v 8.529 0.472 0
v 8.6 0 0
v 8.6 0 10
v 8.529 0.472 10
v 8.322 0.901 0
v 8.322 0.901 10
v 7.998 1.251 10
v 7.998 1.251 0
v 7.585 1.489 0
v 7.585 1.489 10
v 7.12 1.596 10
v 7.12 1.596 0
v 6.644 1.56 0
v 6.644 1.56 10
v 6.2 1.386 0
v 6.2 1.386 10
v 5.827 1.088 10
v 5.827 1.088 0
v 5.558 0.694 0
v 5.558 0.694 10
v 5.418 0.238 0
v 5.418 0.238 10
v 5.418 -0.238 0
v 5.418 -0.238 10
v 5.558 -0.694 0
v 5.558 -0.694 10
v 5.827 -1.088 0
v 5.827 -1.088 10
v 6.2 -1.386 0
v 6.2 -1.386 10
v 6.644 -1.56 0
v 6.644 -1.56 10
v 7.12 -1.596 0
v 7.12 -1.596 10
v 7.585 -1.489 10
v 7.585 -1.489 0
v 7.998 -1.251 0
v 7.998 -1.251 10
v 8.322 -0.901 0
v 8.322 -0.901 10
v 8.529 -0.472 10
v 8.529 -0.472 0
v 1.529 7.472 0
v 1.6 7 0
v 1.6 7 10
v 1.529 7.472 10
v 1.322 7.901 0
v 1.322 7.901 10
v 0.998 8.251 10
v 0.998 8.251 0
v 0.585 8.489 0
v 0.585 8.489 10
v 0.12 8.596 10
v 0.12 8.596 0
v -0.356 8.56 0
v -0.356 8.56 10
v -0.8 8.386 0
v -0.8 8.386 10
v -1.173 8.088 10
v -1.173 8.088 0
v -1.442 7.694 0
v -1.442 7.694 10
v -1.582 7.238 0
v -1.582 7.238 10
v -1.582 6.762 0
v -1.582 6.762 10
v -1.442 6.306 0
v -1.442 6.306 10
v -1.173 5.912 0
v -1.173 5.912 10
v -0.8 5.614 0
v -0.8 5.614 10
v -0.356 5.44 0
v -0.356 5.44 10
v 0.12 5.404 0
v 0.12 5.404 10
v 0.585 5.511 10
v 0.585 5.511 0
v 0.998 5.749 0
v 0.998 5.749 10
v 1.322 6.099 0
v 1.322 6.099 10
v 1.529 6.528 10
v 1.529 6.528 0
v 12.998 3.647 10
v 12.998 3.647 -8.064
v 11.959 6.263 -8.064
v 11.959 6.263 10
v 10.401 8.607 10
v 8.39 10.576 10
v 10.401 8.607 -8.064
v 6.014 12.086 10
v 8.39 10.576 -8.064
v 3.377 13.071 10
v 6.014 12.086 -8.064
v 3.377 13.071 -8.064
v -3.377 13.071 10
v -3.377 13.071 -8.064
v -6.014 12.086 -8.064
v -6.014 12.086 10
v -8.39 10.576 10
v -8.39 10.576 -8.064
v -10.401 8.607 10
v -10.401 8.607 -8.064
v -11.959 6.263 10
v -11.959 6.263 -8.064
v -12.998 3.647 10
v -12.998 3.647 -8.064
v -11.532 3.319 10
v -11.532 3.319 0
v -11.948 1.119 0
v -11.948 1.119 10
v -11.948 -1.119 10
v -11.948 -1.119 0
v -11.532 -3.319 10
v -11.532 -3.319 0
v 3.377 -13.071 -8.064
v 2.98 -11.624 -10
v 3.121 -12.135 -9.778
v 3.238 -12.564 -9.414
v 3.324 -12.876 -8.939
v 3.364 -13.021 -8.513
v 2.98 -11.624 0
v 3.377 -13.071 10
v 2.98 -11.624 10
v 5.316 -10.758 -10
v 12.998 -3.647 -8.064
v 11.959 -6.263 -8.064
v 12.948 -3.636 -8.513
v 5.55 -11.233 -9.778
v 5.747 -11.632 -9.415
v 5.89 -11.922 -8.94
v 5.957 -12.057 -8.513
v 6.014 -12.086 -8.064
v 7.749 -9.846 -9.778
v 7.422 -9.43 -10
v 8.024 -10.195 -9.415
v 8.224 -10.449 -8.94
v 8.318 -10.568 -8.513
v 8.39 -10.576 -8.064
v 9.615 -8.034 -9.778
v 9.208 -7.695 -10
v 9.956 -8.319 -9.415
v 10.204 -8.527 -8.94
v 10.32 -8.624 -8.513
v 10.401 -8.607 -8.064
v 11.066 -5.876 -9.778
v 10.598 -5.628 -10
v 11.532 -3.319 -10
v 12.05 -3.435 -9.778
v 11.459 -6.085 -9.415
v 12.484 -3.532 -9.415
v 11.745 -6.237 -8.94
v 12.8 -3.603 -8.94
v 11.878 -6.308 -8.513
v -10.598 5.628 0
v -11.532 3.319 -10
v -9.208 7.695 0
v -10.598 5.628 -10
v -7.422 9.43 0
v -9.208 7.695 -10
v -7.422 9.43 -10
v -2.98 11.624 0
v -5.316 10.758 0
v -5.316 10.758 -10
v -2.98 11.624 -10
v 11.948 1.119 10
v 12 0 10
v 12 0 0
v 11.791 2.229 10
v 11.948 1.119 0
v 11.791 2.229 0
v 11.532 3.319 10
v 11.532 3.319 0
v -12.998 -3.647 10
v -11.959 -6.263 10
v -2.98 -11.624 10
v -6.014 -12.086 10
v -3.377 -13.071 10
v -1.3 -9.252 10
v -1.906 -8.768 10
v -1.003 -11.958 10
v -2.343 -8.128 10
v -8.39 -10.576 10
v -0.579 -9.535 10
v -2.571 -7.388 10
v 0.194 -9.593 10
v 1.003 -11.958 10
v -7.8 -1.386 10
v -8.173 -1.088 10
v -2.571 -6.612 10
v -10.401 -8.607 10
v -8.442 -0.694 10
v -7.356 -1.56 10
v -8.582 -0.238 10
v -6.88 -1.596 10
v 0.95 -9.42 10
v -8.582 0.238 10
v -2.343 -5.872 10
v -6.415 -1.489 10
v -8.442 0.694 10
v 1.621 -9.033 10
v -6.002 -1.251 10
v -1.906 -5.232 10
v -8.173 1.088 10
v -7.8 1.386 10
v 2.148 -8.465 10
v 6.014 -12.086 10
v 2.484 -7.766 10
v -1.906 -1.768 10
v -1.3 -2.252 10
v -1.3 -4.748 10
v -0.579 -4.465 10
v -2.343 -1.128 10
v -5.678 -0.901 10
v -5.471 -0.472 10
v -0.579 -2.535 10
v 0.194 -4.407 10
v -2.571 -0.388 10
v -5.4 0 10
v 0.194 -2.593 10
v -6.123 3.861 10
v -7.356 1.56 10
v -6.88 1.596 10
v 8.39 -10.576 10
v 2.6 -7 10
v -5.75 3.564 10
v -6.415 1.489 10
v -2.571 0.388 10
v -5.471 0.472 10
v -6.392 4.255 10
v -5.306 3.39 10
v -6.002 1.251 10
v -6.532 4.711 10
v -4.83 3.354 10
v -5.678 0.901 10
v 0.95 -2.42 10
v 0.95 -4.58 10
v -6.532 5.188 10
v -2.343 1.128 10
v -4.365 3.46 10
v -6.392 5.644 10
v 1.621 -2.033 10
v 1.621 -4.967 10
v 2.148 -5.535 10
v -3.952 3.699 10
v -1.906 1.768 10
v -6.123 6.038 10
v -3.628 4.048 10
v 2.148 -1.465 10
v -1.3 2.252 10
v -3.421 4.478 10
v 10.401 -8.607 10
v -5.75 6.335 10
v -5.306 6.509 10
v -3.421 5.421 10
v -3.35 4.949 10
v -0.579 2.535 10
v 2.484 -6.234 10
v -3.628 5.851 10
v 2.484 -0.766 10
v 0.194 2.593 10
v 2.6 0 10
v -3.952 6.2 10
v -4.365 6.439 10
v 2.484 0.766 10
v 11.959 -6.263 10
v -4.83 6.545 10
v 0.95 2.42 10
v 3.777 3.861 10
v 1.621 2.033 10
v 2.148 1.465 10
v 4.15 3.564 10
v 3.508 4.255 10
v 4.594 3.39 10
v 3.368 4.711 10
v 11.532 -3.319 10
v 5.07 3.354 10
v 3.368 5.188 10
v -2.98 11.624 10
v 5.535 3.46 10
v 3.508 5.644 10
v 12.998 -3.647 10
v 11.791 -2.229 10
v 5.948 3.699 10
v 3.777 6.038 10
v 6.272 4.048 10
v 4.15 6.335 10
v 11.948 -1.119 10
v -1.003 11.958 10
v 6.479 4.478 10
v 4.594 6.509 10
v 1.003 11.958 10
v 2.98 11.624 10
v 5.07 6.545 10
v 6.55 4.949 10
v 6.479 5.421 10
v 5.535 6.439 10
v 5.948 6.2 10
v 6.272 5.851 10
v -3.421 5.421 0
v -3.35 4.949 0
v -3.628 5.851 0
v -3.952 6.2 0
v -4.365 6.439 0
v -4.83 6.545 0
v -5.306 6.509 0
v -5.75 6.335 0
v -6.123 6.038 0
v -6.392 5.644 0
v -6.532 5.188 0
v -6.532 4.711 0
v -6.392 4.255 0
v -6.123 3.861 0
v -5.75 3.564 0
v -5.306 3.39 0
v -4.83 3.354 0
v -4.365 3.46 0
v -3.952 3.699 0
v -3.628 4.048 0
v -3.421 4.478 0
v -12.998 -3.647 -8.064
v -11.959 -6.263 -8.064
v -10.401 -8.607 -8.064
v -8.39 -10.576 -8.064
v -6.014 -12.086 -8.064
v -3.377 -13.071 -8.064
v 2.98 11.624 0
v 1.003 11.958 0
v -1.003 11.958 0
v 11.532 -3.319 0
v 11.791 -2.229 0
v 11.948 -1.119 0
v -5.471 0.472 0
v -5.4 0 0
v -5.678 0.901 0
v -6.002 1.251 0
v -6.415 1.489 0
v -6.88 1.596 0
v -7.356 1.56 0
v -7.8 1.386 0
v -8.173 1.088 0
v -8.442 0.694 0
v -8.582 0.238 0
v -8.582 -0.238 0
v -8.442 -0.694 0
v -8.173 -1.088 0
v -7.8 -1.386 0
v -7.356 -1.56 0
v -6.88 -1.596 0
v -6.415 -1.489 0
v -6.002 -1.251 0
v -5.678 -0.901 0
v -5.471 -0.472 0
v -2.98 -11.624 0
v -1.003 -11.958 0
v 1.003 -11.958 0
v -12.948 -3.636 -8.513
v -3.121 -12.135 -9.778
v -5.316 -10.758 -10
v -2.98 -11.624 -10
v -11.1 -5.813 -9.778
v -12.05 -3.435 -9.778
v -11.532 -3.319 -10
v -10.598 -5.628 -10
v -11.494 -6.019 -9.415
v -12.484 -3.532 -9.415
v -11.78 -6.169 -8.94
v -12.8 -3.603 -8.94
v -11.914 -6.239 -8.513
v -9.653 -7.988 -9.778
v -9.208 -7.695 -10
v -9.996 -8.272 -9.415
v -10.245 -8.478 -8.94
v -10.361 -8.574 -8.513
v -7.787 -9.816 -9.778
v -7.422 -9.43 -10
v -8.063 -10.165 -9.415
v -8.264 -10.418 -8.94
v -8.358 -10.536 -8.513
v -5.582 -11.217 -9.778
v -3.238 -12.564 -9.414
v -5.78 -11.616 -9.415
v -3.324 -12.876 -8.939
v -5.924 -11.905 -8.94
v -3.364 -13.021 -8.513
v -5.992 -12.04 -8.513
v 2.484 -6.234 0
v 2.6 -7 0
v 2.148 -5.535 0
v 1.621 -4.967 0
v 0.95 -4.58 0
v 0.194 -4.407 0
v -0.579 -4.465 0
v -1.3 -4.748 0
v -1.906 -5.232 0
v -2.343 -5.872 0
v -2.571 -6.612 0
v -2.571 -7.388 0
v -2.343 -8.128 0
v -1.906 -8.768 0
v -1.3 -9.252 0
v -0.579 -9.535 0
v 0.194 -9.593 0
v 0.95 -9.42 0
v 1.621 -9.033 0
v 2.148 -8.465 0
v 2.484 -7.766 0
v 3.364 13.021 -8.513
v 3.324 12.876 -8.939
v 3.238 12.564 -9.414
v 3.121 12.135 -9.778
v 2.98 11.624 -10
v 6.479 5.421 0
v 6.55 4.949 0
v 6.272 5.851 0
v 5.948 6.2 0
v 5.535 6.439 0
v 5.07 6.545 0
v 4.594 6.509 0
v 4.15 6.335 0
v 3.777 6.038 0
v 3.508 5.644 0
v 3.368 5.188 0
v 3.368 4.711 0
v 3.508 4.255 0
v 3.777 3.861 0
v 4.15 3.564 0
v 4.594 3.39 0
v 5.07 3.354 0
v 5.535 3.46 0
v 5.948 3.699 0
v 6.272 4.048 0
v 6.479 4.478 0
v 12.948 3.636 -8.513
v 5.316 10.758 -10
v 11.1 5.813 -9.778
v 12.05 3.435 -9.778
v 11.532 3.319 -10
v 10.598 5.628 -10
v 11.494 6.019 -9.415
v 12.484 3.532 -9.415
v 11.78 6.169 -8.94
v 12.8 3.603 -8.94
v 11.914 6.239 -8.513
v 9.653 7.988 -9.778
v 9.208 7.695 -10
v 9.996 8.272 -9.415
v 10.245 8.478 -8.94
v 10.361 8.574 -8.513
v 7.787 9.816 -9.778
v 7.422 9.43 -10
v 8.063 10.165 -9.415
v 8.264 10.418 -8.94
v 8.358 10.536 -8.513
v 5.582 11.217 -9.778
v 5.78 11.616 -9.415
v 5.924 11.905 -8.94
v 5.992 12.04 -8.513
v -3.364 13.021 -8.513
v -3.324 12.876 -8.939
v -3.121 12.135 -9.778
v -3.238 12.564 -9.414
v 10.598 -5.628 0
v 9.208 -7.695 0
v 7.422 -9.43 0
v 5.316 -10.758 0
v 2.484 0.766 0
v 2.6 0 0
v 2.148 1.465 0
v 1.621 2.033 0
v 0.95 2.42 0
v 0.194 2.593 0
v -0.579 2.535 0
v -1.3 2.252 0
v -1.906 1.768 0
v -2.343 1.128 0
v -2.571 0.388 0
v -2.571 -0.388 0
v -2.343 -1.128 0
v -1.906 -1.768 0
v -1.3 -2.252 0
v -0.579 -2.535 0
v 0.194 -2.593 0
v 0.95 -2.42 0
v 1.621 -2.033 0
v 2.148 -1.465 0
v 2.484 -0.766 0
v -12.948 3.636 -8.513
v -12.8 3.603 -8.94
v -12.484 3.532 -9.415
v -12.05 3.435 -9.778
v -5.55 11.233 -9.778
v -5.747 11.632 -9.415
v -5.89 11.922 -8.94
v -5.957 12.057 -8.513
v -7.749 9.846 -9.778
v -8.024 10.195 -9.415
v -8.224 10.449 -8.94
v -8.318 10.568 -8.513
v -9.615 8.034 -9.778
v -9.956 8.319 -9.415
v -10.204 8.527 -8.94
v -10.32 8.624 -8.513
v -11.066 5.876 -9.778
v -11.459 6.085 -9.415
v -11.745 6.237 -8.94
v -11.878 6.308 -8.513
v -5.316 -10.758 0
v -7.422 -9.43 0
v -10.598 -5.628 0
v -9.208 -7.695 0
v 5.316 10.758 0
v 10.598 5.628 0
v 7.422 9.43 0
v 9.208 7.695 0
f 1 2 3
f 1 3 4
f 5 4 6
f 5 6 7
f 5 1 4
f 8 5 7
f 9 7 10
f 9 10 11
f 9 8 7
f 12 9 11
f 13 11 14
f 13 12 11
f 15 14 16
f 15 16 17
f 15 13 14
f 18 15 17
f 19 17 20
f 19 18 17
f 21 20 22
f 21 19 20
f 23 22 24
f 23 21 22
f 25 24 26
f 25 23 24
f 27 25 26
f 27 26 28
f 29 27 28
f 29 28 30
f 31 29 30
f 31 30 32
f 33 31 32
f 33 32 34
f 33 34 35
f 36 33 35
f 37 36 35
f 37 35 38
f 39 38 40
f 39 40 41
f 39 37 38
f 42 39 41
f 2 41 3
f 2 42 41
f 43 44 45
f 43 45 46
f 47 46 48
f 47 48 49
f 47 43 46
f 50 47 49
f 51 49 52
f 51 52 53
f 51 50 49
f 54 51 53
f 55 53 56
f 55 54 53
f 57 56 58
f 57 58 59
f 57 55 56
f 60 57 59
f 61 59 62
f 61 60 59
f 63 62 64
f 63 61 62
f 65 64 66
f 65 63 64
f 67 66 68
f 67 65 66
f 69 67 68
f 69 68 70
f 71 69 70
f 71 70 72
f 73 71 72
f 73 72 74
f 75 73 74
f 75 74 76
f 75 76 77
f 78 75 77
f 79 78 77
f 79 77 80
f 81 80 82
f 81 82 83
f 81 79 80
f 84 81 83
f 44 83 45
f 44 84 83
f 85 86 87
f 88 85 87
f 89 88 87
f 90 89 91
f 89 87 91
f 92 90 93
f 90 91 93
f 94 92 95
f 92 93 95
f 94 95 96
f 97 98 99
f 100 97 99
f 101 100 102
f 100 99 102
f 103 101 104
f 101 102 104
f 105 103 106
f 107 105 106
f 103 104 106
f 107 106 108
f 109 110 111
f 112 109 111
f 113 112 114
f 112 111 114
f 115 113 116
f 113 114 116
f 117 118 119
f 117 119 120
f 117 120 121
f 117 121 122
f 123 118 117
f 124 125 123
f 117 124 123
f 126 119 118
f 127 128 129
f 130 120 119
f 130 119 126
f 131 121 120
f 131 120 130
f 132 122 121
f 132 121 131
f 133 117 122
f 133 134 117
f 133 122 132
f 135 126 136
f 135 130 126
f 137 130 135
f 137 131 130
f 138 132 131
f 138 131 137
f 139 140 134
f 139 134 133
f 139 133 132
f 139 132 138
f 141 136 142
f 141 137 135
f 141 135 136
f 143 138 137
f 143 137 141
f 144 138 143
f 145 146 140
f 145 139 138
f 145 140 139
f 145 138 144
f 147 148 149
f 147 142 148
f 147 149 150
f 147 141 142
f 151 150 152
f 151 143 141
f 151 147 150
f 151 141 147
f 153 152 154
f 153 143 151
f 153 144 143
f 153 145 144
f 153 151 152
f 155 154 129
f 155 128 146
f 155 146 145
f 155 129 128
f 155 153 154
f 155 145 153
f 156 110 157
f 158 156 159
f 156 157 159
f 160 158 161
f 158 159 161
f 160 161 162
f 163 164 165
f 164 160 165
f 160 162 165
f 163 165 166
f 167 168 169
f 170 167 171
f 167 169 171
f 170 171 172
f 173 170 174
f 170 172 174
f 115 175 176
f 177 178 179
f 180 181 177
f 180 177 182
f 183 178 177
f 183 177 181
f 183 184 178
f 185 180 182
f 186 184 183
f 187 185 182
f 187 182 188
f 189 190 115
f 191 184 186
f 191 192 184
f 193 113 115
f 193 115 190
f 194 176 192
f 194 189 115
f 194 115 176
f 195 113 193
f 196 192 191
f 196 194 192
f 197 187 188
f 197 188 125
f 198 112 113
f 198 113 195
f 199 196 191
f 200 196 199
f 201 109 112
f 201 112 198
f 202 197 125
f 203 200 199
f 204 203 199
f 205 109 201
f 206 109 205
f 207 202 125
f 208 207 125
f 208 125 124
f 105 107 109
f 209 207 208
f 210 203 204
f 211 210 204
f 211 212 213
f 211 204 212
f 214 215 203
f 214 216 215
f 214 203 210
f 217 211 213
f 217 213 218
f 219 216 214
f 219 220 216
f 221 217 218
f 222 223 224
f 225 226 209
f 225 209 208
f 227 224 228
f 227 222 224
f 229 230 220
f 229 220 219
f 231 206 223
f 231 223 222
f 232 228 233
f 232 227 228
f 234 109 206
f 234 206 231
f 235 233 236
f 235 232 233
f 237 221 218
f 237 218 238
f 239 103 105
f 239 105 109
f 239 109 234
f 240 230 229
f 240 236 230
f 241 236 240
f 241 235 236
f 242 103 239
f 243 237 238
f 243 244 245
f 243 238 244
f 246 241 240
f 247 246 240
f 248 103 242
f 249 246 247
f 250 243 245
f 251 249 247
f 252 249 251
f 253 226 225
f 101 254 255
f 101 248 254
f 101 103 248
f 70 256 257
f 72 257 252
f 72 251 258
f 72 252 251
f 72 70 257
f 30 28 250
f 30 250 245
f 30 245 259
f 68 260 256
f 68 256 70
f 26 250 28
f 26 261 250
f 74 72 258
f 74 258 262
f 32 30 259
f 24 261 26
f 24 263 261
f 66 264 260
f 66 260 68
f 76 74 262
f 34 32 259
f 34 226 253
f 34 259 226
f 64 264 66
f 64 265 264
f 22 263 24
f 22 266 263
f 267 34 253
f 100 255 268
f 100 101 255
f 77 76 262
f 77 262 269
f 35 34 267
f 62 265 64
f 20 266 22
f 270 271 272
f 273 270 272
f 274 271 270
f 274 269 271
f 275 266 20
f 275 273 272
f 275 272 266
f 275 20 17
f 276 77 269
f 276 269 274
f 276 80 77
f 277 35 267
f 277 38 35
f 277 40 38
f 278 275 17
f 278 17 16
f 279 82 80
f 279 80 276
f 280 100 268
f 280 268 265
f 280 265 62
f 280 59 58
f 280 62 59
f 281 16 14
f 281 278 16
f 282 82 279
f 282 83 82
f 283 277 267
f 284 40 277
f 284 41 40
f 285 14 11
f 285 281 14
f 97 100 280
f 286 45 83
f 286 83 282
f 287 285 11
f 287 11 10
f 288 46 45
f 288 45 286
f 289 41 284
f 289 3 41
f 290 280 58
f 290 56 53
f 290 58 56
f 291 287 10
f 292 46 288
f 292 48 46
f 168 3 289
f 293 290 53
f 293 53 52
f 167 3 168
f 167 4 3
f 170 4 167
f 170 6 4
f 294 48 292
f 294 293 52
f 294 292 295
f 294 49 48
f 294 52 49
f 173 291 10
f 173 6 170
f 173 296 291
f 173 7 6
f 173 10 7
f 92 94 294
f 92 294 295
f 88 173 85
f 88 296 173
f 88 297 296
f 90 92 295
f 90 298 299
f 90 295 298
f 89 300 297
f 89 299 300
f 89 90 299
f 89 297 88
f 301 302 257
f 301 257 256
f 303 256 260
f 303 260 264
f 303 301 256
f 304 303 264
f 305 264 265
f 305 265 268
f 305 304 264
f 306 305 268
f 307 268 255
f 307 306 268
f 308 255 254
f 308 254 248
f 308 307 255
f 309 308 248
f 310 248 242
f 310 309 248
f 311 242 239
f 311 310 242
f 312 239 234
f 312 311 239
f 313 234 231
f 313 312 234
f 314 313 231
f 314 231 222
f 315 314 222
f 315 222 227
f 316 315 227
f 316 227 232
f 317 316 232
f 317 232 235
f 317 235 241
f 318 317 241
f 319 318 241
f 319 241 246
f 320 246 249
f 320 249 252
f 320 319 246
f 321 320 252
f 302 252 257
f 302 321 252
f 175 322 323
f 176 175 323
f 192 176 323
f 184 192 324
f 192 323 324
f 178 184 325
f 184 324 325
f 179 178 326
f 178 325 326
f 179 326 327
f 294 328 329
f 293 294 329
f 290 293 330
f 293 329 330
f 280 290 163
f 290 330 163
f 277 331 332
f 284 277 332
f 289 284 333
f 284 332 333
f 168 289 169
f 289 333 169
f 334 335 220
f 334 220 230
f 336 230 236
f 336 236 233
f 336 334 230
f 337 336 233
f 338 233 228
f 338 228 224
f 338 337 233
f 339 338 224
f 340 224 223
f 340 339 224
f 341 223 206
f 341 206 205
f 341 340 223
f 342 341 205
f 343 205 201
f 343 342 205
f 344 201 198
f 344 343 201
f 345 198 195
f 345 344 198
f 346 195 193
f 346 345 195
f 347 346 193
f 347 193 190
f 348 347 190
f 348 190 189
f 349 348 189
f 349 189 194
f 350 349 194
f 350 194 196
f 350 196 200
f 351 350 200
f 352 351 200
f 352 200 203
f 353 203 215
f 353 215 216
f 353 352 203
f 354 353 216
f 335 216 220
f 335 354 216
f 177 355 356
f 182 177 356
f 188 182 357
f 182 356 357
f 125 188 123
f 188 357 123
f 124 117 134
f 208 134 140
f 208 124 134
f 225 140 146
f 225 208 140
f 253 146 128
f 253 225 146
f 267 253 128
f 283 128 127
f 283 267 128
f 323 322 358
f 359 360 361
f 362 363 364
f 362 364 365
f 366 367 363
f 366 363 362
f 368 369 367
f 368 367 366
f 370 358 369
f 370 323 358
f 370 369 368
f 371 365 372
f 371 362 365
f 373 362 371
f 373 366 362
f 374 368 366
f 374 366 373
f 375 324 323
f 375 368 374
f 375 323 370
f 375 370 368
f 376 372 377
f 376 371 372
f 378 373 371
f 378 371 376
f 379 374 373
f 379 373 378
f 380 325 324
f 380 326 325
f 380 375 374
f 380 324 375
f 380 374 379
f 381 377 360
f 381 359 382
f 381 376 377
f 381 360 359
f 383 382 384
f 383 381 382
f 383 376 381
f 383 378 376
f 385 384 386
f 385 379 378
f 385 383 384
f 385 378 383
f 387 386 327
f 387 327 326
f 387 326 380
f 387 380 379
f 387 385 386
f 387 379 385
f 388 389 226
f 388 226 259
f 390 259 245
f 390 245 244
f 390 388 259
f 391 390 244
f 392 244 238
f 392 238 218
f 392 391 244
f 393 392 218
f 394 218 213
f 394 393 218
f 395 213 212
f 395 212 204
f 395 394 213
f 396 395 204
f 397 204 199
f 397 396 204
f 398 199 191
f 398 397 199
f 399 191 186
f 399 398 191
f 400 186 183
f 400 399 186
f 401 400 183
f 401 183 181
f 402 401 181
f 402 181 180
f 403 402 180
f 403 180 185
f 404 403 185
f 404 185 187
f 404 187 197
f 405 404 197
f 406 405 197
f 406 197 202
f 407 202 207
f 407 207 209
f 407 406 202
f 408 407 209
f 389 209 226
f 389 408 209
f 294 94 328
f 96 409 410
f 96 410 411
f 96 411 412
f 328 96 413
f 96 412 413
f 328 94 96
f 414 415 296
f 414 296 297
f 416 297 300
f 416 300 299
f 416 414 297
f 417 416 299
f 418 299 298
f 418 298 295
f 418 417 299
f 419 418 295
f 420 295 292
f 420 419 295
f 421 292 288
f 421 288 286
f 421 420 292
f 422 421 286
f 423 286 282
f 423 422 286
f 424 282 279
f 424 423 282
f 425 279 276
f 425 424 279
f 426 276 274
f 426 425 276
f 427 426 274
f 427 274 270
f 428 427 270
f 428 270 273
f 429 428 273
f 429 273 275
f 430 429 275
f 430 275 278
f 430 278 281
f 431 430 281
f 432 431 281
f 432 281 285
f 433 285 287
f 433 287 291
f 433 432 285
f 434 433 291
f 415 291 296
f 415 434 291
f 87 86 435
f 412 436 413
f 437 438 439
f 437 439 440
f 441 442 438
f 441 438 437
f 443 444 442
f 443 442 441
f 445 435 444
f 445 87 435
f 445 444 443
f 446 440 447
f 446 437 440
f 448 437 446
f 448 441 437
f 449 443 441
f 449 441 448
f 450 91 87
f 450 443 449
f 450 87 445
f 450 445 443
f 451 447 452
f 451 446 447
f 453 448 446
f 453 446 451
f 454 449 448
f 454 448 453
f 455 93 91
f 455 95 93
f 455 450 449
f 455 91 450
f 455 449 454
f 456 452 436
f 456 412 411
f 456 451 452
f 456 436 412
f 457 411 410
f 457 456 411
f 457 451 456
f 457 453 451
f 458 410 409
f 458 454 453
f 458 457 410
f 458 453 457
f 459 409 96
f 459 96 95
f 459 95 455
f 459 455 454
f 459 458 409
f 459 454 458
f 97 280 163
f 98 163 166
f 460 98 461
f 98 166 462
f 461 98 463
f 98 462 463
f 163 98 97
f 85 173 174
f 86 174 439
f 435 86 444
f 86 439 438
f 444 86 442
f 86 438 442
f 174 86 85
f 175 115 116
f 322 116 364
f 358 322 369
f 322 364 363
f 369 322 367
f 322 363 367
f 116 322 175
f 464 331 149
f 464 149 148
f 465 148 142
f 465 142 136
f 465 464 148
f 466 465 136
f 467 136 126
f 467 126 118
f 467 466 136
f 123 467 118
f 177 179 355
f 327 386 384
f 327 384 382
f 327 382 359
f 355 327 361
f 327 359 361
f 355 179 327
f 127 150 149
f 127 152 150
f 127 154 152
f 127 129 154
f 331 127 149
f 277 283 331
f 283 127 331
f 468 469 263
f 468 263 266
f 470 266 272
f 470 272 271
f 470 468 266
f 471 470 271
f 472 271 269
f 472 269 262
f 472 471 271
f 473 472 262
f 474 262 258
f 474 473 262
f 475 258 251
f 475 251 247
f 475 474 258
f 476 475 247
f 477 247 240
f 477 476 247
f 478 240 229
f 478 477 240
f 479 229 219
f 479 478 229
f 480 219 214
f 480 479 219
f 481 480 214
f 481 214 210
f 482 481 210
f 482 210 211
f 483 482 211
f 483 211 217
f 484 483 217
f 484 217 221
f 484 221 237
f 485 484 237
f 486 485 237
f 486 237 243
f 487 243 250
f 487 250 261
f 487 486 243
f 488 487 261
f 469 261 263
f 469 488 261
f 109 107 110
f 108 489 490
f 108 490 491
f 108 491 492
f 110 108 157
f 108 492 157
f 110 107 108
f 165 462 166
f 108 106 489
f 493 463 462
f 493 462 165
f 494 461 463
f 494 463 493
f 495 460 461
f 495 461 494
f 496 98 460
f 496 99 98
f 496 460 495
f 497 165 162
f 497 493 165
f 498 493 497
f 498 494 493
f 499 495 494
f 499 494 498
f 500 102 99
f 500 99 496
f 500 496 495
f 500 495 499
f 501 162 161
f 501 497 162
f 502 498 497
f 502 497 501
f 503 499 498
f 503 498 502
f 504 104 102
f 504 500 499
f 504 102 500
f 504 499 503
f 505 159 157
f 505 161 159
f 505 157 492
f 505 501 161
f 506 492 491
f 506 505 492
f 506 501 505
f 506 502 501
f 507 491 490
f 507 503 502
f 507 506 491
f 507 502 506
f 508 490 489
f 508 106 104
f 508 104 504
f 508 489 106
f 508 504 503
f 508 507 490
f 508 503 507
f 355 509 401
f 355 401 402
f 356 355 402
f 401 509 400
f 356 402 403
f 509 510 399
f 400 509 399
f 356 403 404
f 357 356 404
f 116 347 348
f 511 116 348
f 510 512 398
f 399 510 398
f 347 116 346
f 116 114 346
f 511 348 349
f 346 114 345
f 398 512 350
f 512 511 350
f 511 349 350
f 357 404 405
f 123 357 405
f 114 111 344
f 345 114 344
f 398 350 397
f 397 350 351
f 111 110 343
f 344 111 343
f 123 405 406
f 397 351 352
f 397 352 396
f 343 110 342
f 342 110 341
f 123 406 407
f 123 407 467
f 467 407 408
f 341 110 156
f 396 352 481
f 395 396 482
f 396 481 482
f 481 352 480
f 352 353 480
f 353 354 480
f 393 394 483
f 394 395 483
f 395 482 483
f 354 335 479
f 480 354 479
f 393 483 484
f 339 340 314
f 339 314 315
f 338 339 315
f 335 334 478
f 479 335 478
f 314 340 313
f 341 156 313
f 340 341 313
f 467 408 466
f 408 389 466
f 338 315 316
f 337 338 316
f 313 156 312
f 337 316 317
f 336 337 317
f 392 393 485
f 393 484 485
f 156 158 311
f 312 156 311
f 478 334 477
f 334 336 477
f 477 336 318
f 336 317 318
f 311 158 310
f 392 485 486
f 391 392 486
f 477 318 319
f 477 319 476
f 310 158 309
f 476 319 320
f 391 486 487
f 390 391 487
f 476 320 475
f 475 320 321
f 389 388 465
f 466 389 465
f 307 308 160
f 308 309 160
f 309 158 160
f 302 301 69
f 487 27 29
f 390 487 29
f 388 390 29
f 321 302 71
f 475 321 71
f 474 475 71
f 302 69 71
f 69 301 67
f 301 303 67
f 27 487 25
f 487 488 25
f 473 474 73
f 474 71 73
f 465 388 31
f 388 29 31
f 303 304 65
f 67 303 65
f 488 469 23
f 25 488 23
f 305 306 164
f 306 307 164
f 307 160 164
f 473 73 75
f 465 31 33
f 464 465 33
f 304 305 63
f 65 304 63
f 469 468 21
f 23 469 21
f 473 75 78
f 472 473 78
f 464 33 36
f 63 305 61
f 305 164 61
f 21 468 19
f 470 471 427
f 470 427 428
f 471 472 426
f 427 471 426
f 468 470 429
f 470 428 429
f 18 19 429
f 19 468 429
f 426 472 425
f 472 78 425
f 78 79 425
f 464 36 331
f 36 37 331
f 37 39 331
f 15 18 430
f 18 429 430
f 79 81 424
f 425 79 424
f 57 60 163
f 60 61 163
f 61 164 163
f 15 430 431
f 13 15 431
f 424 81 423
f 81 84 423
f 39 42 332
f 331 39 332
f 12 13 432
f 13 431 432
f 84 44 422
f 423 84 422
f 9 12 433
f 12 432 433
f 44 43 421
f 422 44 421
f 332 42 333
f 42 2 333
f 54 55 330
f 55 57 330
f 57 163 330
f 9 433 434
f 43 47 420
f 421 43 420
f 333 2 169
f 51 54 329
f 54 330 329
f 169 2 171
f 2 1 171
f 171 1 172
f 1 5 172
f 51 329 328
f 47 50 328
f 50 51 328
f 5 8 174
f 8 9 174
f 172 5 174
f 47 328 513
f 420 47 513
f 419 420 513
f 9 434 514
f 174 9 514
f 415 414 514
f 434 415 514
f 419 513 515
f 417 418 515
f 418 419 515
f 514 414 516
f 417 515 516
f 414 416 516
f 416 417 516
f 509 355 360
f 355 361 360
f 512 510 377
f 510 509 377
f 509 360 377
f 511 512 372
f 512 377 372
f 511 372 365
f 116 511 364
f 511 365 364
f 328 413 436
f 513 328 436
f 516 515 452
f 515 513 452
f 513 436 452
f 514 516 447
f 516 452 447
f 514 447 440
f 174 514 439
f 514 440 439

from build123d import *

# Parameters (mm, degrees)
F0_R        = 4.25
F0_R_2      = 2.6
F1_DEPTH    = 10
F0_R_3      = 10.25
F0_R_4      = 1.6
F2_DEPTH    = 10
F3_DEPTH    = 10
F4_DEPTH    = 10
F5_T2_ANGLE = 100.939379093
F5_T4_ANGLE = 100.939379093
F5_T6_ANGLE = 100.939379093
F5_T8_ANGLE = 100.939379093


# Not quite as in the source:
# - a fillet or chamfer that OpenCascade refuses, or shapes differently, is made with other operations: its cross-section is extruded or revolved along the edge and cut away or added


with BuildPart() as f1:
    # F0 (on Top) → F1 (new body)
    with BuildSketch(Plane.XY):
        Circle(F0_R)
        Circle(F0_R_2, mode=Mode.SUBTRACT)
    extrude(amount=F1_DEPTH)

    # F0 (on Top) → F2 (join)
    with BuildSketch(Plane.XY):
        Circle(F0_R_3)
        with Locations((0, -7)):
            Circle(F0_R_2, mode=Mode.SUBTRACT)
        with Locations((-7, 0)):
            Circle(F0_R_4, mode=Mode.SUBTRACT)
        with Locations((-4.95, 4.9494949237)):
            Circle(F0_R_4, mode=Mode.SUBTRACT)
        Circle(F0_R, mode=Mode.SUBTRACT)
        with Locations((4.95, 4.9494949237)):
            Circle(F0_R_4, mode=Mode.SUBTRACT)
        with Locations((7, 0)):
            Circle(F0_R_4, mode=Mode.SUBTRACT)
        with Locations((0, 7)):
            Circle(F0_R_4, mode=Mode.SUBTRACT)
    extrude(amount=F2_DEPTH)

    # F0 (on Top) → F3 (join)
    with BuildSketch(Plane.XY):
        with BuildLine():
            ThreePointArc((11.5318049333, -3.3192581973), (11.8823747458, -1.6760579943), (12, 0))
            ThreePointArc((12, 0), (11.8823747458, 1.6760579943), (11.5318049333, 3.3192581973))
            ThreePointArc((11.5318049333, 3.3192581973), (8.3601945025, 8.6085508583), (2.9803472847, 11.6240066269))
            ThreePointArc((2.9803472847, 11.6240066269), (0, 12), (-2.9803472847, 11.6240066269))
            ThreePointArc((-2.9803472847, 11.6240066269), (-8.3601945025, 8.6085508583), (-11.5318049333, 3.3192581973))
            ThreePointArc((-11.5318049333, 3.3192581973), (-12, 0), (-11.5318049333, -3.3192581973))
            ThreePointArc((-11.5318049333, -3.3192581973), (-8.3601945025, -8.6085508583), (-2.9803472847, -11.6240066269))
            ThreePointArc((-2.9803472847, -11.6240066269), (0, -12), (2.9803472847, -11.6240066269))
            ThreePointArc((2.9803472847, -11.6240066269), (8.3601945025, -8.6085508583), (11.5318049333, -3.3192581973))
        make_face()
        Circle(F0_R_3, mode=Mode.SUBTRACT)
    extrude(amount=F3_DEPTH)

    # F0 (on Top) → F4 (join, symmetric)
    with BuildSketch(Plane.XY):
        with BuildLine():
            ThreePointArc((2.9803472847, 11.6240066269), (8.3601945025, 8.6085508583), (11.5318049333, 3.3192581973))
            Line((11.5318049333, 3.3192581973), (12.9980264072, 3.6470960391))
            ThreePointArc((12.9980264072, 3.6470960391), (9.4466784184, 9.6441830582), (3.3774018659, 13.070698399))
            Line((3.3774018659, 13.070698399), (2.9803472847, 11.6240066269))
        make_face()
        with BuildLine():
            ThreePointArc((-11.5318049333, 3.3192581973), (-8.3601945025, 8.6085508583), (-2.9803472847, 11.6240066269))
            Line((-2.9803472847, 11.6240066269), (-3.3774018659, 13.070698399))
            ThreePointArc((-3.3774018659, 13.070698399), (-9.4466784184, 9.6441830582), (-12.9980264072, 3.6470960391))
            Line((-12.9980264072, 3.6470960391), (-11.5318049333, 3.3192581973))
        make_face()
        with BuildLine():
            Line((-3.3774018659, -13.070698399), (-2.9803472847, -11.6240066269))
            ThreePointArc((-2.9803472847, -11.6240066269), (-8.3601945025, -8.6085508583), (-11.5318049333, -3.3192581973))
            Line((-11.5318049333, -3.3192581973), (-12.9980264072, -3.6470960391))
            ThreePointArc((-12.9980264072, -3.6470960391), (-9.4466784184, -9.6441830582), (-3.3774018659, -13.070698399))
        make_face()
        with BuildLine():
            Line((12.9980264072, -3.6470960391), (11.5318049333, -3.3192581973))
            ThreePointArc((11.5318049333, -3.3192581973), (8.3601945025, -8.6085508583), (2.9803472847, -11.6240066269))
            Line((2.9803472847, -11.6240066269), (3.3774018659, -13.070698399))
            ThreePointArc((3.3774018659, -13.070698399), (9.4466784184, -9.6441830582), (12.9980264072, -3.6470960391))
        make_face()
    extrude(amount=F4_DEPTH, both=True)

    # F5: fillet of radius 2 on 4 edges, made by hand

    # F5_s1 → F5_t2 (revolve, cut)
    with BuildSketch(Plane(origin=(0, 0, 0), x_dir=(0, 0, 1), z_dir=(-0.0850162065, -0.9963795686, 0))):
        with BuildLine():
            ThreePointArc((-10, -12), (-9.2882531983, -13.0811388301), (-8.0635083269, -13.5))
            Line((-8.0635083269, -13.5), (-10, -13.5))
            Line((-10, -13.5), (-10, -12))
        make_face()
    revolve(axis=Axis((0, 0, -10), (0, 0, 1)), revolution_arc=F5_T2_ANGLE, mode=Mode.SUBTRACT)

    # F5_s3 → F5_t4 (revolve, cut)
    with BuildSketch(Plane(origin=(0, 0, 0), x_dir=(0, 0, 1), z_dir=(0.9944074241, -0.1056119072, 0))):
        with BuildLine():
            ThreePointArc((-10, -12), (-9.2882531983, -13.0811388301), (-8.0635083269, -13.5))
            Line((-8.0635083269, -13.5), (-10, -13.5))
            Line((-10, -13.5), (-10, -12))
        make_face()
    revolve(axis=Axis((0, 0, -10), (0, 0, 1)), revolution_arc=F5_T4_ANGLE, mode=Mode.SUBTRACT)

    # F5_s5 → F5_t6 (revolve, cut)
    with BuildSketch(Plane(origin=(0, 0, 0), x_dir=(0, 0, 1), z_dir=(0.0850162065, 0.9963795686, 0))):
        with BuildLine():
            ThreePointArc((-10, -12), (-9.2882531983, -13.0811388301), (-8.0635083269, -13.5))
            Line((-8.0635083269, -13.5), (-10, -13.5))
            Line((-10, -13.5), (-10, -12))
        make_face()
    revolve(axis=Axis((0, 0, -10), (0, 0, 1)), revolution_arc=F5_T6_ANGLE, mode=Mode.SUBTRACT)

    # F5_s7 → F5_t8 (revolve, cut)
    with BuildSketch(Plane(origin=(0, 0, 0), x_dir=(0, 0, 1), z_dir=(-0.9944074241, 0.1056119072, 0))):
        with BuildLine():
            ThreePointArc((-10, -12), (-9.2882531983, -13.0811388301), (-8.0635083269, -13.5))
            Line((-8.0635083269, -13.5), (-10, -13.5))
            Line((-10, -13.5), (-10, -12))
        make_face()
    revolve(axis=Axis((0, 0, -10), (0, 0, 1)), revolution_arc=F5_T8_ANGLE, mode=Mode.SUBTRACT)


solid = f1.part
